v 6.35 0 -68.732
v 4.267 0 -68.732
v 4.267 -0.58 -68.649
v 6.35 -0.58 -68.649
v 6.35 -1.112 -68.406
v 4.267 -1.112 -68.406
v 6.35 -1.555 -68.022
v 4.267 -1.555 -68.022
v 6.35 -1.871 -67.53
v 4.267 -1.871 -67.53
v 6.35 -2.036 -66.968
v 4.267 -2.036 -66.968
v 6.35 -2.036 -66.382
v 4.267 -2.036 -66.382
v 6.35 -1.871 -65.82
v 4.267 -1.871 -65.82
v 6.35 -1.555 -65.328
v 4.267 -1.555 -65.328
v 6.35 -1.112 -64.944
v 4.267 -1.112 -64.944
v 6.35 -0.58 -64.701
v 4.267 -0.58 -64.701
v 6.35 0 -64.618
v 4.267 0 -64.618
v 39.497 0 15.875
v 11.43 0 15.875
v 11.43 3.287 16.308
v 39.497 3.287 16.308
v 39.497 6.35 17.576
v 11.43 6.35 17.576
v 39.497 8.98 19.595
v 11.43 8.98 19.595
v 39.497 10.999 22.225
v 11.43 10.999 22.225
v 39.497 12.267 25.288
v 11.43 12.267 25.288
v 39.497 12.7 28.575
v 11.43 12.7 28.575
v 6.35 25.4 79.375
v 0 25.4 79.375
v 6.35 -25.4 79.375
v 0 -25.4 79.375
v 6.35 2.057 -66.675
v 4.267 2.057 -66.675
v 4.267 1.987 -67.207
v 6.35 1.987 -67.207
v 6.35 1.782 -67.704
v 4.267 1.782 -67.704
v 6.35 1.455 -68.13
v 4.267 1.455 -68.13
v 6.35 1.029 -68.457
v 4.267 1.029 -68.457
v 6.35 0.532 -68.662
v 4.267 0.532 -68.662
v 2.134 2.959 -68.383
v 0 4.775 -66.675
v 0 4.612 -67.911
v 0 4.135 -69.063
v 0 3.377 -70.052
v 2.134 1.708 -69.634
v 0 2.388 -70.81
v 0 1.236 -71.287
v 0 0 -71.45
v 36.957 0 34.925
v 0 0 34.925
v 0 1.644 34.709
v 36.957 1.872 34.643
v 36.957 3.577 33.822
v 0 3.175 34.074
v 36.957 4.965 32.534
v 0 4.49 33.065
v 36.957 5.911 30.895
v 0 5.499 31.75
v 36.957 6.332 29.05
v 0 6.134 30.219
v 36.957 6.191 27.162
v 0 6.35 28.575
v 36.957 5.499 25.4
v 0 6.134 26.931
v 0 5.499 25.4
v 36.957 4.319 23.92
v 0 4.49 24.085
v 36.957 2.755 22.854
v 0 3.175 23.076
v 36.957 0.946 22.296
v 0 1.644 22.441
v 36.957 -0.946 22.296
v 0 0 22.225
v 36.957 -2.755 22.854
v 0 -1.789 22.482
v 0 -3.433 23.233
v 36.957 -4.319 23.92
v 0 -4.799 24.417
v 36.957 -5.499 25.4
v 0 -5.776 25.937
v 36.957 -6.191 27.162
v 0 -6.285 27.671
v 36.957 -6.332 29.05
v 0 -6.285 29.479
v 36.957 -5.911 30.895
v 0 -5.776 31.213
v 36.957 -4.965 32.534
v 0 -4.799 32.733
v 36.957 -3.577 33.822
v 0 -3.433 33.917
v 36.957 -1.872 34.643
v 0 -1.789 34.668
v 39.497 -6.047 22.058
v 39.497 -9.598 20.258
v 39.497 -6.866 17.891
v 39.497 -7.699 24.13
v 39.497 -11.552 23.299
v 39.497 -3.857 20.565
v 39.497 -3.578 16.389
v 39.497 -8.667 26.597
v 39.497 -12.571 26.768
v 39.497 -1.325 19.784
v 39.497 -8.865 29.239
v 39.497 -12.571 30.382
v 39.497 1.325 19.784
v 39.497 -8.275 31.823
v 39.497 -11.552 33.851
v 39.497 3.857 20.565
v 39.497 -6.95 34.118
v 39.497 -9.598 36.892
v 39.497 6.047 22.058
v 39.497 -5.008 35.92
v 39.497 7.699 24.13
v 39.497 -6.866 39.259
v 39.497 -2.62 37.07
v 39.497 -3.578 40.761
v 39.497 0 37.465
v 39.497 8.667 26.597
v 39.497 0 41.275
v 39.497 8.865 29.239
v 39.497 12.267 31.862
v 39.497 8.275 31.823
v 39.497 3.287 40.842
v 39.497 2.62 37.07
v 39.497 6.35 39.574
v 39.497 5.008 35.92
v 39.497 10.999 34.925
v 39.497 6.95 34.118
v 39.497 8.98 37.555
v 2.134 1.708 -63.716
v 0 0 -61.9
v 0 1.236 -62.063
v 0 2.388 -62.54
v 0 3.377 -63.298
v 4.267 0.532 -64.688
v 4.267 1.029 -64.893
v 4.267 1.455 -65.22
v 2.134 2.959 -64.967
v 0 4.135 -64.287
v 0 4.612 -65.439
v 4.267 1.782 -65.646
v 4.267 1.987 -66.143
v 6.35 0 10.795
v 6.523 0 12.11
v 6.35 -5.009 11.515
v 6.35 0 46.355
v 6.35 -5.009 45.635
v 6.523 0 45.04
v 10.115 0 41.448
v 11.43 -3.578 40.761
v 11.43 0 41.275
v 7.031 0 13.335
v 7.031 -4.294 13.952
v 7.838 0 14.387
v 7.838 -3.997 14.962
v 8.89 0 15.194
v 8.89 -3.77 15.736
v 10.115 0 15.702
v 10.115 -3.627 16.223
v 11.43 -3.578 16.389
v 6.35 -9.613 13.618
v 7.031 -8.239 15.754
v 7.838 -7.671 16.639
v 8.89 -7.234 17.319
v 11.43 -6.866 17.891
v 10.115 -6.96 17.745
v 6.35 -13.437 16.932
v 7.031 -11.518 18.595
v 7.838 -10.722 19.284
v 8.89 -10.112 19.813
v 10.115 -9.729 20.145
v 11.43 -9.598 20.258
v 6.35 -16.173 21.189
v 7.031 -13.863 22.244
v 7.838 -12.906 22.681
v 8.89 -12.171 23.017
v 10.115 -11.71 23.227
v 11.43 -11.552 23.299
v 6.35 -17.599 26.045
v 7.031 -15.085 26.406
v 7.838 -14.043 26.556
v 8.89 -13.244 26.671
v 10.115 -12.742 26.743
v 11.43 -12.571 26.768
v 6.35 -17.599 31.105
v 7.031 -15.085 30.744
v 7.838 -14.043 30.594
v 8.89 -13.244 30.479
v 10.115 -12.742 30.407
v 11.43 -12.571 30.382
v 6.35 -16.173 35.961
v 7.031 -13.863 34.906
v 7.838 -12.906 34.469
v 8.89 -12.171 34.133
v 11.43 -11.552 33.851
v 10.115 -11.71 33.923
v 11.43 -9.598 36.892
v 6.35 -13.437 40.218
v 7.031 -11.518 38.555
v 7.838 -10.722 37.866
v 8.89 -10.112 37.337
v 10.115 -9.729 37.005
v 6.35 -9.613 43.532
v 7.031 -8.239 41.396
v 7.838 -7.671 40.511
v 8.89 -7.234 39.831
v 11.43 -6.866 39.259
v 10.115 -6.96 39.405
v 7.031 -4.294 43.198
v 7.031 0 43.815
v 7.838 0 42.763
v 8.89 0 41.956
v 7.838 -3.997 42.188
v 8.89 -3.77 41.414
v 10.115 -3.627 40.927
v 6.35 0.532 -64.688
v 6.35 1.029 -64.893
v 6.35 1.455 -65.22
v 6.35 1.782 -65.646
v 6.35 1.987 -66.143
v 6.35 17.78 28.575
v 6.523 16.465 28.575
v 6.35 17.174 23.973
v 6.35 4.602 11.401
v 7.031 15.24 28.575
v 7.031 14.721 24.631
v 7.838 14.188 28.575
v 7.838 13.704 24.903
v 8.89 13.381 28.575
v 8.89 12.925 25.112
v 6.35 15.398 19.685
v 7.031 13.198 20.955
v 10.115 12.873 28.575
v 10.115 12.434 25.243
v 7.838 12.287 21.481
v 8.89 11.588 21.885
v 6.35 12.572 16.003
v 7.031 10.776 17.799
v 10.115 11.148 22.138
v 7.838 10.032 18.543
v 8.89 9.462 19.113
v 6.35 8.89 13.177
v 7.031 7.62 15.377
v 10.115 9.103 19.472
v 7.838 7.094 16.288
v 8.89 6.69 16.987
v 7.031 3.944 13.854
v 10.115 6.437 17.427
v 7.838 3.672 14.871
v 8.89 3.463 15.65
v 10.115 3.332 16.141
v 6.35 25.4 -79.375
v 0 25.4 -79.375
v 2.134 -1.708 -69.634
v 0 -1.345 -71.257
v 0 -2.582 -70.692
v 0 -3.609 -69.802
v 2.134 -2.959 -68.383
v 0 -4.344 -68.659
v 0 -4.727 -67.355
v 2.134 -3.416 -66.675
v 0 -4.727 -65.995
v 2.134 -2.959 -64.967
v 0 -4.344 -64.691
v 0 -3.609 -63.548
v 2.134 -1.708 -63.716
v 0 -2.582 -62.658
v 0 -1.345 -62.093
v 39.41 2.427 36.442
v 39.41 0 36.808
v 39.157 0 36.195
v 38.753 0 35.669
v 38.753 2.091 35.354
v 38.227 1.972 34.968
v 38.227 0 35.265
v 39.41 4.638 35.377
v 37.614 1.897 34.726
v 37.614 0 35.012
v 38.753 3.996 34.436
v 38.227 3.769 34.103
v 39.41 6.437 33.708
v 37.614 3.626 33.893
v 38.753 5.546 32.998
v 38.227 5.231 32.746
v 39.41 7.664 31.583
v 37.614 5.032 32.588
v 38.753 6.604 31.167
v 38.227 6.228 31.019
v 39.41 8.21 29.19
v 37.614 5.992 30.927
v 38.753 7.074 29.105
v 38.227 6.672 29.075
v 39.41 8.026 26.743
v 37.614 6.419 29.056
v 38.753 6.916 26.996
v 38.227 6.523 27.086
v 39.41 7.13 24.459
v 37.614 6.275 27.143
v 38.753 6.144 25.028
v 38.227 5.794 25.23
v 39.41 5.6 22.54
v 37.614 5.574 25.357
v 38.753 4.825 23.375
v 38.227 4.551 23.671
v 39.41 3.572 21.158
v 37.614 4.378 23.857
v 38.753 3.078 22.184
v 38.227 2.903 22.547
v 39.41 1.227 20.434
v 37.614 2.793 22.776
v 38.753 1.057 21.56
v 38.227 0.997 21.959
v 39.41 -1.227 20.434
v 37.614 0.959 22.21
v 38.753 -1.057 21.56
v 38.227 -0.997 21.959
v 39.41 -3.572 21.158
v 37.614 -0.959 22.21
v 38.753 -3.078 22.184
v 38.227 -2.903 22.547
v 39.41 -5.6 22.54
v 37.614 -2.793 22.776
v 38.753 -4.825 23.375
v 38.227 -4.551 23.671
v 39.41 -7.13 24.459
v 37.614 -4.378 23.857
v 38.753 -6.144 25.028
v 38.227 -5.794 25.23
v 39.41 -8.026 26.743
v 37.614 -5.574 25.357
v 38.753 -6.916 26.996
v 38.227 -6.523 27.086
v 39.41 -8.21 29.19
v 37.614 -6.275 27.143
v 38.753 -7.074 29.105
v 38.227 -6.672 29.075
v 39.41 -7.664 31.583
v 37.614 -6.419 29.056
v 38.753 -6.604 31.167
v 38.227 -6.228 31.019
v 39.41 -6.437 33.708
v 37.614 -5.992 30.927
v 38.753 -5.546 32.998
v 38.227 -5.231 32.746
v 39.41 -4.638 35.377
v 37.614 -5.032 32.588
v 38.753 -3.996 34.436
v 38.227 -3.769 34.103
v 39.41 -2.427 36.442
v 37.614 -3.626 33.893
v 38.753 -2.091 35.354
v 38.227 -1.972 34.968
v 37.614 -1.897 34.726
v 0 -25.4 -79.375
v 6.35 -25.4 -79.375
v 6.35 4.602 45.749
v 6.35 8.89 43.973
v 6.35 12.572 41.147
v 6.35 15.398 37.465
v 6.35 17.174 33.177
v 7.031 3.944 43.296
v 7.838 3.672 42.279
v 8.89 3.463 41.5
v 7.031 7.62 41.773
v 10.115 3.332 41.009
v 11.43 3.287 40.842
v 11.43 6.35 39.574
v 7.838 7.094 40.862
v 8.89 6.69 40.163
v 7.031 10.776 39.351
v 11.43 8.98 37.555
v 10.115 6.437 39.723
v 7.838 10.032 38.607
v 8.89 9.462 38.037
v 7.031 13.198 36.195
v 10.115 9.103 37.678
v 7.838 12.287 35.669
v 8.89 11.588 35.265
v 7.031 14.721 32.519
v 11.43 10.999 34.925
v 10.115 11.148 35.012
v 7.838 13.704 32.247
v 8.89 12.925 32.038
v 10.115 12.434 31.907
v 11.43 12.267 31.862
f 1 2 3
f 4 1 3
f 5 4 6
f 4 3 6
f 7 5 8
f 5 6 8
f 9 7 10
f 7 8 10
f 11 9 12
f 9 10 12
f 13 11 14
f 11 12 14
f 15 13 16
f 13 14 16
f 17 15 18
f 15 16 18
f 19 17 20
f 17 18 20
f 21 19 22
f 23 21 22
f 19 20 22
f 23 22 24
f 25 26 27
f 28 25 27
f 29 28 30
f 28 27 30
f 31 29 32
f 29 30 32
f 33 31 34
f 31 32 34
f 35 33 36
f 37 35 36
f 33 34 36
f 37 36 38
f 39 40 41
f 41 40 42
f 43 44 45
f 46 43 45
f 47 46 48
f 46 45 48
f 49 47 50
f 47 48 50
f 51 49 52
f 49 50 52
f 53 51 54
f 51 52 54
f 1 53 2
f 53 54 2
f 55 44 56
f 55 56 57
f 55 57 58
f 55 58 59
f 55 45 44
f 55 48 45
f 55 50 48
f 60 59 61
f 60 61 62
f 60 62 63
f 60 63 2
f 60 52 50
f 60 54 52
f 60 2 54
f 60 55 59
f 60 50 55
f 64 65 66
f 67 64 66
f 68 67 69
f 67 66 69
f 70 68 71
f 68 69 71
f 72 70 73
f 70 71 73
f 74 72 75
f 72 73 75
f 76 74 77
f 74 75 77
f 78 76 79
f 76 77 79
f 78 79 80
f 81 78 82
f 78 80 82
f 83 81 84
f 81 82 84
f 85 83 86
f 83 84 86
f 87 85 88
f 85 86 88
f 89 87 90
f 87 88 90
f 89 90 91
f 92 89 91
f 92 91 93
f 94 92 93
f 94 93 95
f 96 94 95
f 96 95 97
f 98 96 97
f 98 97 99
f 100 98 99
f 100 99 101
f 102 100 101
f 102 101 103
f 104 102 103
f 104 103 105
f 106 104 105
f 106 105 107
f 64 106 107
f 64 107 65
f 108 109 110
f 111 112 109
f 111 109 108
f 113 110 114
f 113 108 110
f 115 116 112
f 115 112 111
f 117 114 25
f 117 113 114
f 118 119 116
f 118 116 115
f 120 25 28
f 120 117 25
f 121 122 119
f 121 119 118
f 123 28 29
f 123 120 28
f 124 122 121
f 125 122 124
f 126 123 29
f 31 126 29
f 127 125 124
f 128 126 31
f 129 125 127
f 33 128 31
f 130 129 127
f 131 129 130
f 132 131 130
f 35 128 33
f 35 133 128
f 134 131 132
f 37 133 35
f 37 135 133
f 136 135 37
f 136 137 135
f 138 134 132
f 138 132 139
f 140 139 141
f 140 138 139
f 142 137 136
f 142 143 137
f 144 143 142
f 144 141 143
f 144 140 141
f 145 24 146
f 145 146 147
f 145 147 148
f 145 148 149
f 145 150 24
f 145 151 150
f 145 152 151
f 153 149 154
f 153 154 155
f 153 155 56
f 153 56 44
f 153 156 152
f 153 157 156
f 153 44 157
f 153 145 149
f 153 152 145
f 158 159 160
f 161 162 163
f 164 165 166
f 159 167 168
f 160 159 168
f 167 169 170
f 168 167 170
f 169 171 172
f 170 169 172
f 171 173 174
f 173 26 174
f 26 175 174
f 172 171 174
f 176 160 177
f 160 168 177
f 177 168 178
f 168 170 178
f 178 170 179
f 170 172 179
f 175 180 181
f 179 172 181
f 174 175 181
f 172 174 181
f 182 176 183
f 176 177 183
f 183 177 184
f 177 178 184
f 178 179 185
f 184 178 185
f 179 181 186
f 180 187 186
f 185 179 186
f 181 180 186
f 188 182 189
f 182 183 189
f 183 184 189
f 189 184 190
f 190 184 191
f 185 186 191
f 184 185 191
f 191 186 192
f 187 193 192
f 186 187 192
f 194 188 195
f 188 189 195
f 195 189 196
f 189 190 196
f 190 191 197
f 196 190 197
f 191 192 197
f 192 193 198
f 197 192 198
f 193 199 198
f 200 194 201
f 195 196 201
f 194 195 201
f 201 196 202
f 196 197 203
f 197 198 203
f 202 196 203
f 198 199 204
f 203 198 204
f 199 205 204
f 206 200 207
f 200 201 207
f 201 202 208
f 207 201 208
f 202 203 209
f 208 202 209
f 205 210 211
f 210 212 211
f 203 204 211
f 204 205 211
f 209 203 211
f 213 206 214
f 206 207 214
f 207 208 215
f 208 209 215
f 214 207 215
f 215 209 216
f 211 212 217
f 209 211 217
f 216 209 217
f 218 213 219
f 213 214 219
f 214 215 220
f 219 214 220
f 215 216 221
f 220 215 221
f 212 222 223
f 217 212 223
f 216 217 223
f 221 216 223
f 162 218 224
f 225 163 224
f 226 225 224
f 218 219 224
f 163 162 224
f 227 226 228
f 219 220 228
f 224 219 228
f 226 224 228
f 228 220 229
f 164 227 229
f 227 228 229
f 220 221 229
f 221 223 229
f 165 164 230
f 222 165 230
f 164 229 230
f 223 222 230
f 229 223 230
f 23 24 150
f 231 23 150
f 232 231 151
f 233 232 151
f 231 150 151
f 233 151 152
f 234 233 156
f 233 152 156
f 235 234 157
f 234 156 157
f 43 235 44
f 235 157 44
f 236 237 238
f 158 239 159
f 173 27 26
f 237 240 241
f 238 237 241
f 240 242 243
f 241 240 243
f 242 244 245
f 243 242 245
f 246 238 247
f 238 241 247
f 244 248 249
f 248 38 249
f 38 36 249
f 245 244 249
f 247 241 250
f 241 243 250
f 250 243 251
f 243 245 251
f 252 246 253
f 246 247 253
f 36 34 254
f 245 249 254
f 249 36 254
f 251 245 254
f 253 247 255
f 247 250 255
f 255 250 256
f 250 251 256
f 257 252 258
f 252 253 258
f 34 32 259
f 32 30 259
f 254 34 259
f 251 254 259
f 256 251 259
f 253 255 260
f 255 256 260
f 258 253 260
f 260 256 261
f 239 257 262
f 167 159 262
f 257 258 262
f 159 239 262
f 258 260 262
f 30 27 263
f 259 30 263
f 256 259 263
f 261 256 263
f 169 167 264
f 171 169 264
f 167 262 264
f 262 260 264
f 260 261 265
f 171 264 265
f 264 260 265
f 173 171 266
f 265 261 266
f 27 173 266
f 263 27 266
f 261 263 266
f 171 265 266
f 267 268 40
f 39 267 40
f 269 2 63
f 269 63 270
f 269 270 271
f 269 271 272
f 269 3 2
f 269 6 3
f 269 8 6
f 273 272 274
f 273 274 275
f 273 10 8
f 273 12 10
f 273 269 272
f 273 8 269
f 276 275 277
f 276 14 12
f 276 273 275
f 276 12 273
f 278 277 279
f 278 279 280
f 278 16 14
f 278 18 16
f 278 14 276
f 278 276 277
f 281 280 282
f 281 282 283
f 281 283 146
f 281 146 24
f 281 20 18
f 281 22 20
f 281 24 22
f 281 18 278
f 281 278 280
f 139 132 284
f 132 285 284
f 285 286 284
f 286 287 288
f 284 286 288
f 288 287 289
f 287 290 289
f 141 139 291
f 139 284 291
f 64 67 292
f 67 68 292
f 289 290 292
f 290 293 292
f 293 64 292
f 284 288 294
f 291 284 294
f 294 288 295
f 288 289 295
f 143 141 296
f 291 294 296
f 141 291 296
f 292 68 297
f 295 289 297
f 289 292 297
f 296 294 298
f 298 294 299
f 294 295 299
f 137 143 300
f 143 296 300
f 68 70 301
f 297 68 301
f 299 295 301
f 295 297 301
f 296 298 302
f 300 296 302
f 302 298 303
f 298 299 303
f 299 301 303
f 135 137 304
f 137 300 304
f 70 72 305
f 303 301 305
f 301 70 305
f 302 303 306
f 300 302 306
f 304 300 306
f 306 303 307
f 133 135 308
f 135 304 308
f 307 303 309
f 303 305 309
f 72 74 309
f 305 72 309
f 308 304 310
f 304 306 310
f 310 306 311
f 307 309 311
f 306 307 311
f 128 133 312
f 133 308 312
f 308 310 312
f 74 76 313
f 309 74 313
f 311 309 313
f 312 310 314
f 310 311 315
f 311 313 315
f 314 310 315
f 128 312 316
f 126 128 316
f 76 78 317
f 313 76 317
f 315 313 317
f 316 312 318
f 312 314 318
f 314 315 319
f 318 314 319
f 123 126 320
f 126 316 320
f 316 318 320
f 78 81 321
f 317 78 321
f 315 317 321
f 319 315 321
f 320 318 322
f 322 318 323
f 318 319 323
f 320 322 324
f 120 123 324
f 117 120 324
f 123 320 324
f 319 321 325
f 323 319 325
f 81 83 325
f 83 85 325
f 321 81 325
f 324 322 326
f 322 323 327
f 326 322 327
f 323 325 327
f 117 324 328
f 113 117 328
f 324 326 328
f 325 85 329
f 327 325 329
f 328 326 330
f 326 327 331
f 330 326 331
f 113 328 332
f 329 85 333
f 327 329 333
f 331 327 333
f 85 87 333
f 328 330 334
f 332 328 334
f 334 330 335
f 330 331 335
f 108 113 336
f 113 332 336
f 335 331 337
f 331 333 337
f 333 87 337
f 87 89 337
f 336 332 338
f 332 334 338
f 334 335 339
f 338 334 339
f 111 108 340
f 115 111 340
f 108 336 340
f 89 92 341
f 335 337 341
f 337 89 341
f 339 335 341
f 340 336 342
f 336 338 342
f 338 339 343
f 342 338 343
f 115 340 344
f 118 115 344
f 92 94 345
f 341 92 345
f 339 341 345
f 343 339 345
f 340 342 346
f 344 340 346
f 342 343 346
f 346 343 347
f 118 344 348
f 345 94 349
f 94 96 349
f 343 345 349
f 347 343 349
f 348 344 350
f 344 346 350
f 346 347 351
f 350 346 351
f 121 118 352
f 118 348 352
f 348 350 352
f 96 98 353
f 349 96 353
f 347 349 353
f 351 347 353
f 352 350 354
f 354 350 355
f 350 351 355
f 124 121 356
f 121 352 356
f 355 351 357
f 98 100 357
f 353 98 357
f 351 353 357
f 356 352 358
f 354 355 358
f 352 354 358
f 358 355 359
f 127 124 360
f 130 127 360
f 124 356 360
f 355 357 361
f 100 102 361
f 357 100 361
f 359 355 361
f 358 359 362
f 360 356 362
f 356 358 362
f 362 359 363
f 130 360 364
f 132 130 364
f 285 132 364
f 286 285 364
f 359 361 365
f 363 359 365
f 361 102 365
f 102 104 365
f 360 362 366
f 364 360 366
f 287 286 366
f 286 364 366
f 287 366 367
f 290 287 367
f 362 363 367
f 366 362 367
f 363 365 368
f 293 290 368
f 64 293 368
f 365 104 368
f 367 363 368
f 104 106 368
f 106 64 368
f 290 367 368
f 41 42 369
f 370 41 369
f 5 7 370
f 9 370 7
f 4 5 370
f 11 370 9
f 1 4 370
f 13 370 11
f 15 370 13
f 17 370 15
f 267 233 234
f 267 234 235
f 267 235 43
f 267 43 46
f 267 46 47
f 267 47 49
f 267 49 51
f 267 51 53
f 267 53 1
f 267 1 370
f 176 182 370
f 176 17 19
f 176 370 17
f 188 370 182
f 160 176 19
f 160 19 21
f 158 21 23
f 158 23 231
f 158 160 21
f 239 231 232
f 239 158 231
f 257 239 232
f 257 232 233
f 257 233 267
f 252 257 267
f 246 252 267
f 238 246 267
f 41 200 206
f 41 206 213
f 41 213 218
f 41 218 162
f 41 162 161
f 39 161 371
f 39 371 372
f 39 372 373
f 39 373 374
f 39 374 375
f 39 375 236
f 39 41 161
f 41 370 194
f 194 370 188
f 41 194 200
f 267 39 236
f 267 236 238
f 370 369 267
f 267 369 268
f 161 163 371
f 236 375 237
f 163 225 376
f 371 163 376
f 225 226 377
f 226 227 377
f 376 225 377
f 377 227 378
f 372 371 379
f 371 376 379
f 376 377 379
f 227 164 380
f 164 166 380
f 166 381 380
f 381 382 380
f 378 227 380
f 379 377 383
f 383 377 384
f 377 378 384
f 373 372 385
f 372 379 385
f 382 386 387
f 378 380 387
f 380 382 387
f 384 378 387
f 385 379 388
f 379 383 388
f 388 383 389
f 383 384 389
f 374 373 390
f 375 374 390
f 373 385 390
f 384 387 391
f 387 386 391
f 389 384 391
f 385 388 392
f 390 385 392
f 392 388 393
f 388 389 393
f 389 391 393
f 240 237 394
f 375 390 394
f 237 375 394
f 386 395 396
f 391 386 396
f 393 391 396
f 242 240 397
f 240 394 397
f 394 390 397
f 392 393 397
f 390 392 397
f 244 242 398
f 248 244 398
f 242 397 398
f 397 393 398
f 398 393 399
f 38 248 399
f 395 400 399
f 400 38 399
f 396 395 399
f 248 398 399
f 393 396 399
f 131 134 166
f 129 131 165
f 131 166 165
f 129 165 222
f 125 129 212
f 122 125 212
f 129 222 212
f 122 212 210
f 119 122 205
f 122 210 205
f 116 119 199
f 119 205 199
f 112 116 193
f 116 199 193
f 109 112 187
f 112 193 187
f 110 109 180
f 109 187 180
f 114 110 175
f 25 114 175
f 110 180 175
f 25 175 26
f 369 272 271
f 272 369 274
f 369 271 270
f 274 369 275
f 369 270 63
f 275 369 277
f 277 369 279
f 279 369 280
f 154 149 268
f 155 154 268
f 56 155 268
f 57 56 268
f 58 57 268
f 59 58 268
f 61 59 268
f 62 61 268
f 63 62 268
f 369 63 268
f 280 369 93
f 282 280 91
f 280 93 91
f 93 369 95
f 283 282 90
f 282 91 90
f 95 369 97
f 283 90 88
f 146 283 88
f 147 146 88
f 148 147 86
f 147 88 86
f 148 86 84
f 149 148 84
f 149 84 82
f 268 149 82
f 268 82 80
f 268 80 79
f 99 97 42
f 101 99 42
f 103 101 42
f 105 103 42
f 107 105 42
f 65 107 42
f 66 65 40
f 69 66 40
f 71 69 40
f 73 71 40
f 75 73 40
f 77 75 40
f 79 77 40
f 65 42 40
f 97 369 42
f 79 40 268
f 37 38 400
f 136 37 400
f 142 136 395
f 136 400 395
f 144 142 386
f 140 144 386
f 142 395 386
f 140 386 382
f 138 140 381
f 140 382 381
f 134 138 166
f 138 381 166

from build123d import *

# Parameters (mm, degrees)
F1_DEPTH = 6.35
F2_DEPTH = 39.497
F3_SIZE2 = 4.2672
F3_SIZE  = 2.7178
F4_R     = 5.08


# Not quite as in the source:
# - a fillet or chamfer that OpenCascade refuses, or shapes differently, is made with other operations: its cross-section is extruded or revolved along the edge and cut away or added


with BuildPart() as f1:
    # F0 (on Right) → F1 (new body)
    with BuildSketch(Plane.YZ):
        with BuildLine():
            Line((0, 79.375), (-25.4, 79.375))
            Line((-25.4, 79.375), (-25.4, -79.375))
            Line((-25.4, -79.375), (0, -79.375))
            Line((0, -79.375), (0, -68.7324))
            ThreePointArc((0, -68.7324), (-2.0574, -66.675), (0, -64.6176))
            Line((0, -64.6176), (0, -53.975))
            Line((0, -53.975), (0, -41.275))
            Line((0, -41.275), (0, 15.875))
            ThreePointArc((0, 15.875), (-12.7, 28.575), (0, 41.275))
            Line((0, 41.275), (0, 79.375))
        make_face()
        with BuildLine():
            Line((25.4, 79.375), (0, 79.375))
            Line((0, 79.375), (0, 41.275))
            ThreePointArc((0, 41.275), (8.9802561211, 37.5552561211), (12.7, 28.575))
            ThreePointArc((12.7, 28.575), (8.9802561211, 19.5947438789), (0, 15.875))
            Line((0, 15.875), (0, -41.275))
            Line((0, -41.275), (0, -53.975))
            Line((0, -53.975), (0, -64.6176))
            ThreePointArc((0, -64.6176), (1.4548014916, -65.2201985084), (2.0574, -66.675))
            ThreePointArc((2.0574, -66.675), (1.4548014916, -68.1298014916), (0, -68.7324))
            Line((0, -68.7324), (0, -79.375))
            Line((0, -79.375), (25.4, -79.375))
            Line((25.4, -79.375), (25.4, 79.375))
        make_face()
        with BuildLine():
            Line((0, 34.925), (0, 41.275))
            ThreePointArc((0, 41.275), (-12.7, 28.575), (0, 15.875))
            Line((0, 15.875), (0, 22.225))
            ThreePointArc((0, 22.225), (-6.35, 28.575), (0, 34.925))
        make_face()
        with BuildLine():
            ThreePointArc((12.7, 28.575), (8.9802561211, 37.5552561211), (0, 41.275))
            Line((0, 41.275), (0, 34.925))
            ThreePointArc((0, 34.925), (4.4901280605, 33.0651280605), (6.35, 28.575))
            ThreePointArc((6.35, 28.575), (4.4901280605, 24.0848719395), (0, 22.225))
            Line((0, 22.225), (0, 15.875))
            ThreePointArc((0, 15.875), (8.9802561211, 19.5947438789), (12.7, 28.575))
        make_face()
    extrude(amount=F1_DEPTH)

    # F0 (on Right) → F2 (join)
    with BuildSketch(Plane.YZ):
        with BuildLine():
            Line((0, 34.925), (0, 41.275))
            ThreePointArc((0, 41.275), (-12.7, 28.575), (0, 15.875))
            Line((0, 15.875), (0, 22.225))
            ThreePointArc((0, 22.225), (-6.35, 28.575), (0, 34.925))
        make_face()
        with BuildLine():
            ThreePointArc((12.7, 28.575), (8.9802561211, 37.5552561211), (0, 41.275))
            Line((0, 41.275), (0, 34.925))
            ThreePointArc((0, 34.925), (4.4901280605, 33.0651280605), (6.35, 28.575))
            ThreePointArc((6.35, 28.575), (4.4901280605, 24.0848719395), (0, 22.225))
            Line((0, 22.225), (0, 15.875))
            ThreePointArc((0, 15.875), (8.9802561211, 19.5947438789), (12.7, 28.575))
        make_face()
    extrude(amount=F2_DEPTH)

    # F3
    f3_edges = [f1.edges().sort_by_distance(p)[0] for p in [
        (0, 0, -68.7324),
    ]]
    f3_side = f1.faces().sort_by_distance((0, 0, -0.344897))[0]
    chamfer(f3_edges, length=F3_SIZE, length2=F3_SIZE2, reference=f3_side)

    # F4
    f4_edges = [f1.edges().sort_by_distance(p)[0] for p in [
        (6.35, 0, 41.275),
    ]]
    fillet(f4_edges, radius=F4_R)

    # F5: fillet of radius 2.54 on 1 edges, made by hand

    # F5_s1 → F5_t2 (revolve, cut)
    with BuildSketch(Plane.XZ):
        with BuildLine():
            ThreePointArc((39.497, 37.465), (38.7530512242, 35.6689487758), (36.957, 34.925))
            Line((36.957, 34.925), (39.497, 34.925))
            Line((39.497, 34.925), (39.497, 37.465))
        make_face()
    revolve(axis=Axis((39.497, 0, 28.575), (-1, 0, 0)), mode=Mode.SUBTRACT)


solid = f1.part
